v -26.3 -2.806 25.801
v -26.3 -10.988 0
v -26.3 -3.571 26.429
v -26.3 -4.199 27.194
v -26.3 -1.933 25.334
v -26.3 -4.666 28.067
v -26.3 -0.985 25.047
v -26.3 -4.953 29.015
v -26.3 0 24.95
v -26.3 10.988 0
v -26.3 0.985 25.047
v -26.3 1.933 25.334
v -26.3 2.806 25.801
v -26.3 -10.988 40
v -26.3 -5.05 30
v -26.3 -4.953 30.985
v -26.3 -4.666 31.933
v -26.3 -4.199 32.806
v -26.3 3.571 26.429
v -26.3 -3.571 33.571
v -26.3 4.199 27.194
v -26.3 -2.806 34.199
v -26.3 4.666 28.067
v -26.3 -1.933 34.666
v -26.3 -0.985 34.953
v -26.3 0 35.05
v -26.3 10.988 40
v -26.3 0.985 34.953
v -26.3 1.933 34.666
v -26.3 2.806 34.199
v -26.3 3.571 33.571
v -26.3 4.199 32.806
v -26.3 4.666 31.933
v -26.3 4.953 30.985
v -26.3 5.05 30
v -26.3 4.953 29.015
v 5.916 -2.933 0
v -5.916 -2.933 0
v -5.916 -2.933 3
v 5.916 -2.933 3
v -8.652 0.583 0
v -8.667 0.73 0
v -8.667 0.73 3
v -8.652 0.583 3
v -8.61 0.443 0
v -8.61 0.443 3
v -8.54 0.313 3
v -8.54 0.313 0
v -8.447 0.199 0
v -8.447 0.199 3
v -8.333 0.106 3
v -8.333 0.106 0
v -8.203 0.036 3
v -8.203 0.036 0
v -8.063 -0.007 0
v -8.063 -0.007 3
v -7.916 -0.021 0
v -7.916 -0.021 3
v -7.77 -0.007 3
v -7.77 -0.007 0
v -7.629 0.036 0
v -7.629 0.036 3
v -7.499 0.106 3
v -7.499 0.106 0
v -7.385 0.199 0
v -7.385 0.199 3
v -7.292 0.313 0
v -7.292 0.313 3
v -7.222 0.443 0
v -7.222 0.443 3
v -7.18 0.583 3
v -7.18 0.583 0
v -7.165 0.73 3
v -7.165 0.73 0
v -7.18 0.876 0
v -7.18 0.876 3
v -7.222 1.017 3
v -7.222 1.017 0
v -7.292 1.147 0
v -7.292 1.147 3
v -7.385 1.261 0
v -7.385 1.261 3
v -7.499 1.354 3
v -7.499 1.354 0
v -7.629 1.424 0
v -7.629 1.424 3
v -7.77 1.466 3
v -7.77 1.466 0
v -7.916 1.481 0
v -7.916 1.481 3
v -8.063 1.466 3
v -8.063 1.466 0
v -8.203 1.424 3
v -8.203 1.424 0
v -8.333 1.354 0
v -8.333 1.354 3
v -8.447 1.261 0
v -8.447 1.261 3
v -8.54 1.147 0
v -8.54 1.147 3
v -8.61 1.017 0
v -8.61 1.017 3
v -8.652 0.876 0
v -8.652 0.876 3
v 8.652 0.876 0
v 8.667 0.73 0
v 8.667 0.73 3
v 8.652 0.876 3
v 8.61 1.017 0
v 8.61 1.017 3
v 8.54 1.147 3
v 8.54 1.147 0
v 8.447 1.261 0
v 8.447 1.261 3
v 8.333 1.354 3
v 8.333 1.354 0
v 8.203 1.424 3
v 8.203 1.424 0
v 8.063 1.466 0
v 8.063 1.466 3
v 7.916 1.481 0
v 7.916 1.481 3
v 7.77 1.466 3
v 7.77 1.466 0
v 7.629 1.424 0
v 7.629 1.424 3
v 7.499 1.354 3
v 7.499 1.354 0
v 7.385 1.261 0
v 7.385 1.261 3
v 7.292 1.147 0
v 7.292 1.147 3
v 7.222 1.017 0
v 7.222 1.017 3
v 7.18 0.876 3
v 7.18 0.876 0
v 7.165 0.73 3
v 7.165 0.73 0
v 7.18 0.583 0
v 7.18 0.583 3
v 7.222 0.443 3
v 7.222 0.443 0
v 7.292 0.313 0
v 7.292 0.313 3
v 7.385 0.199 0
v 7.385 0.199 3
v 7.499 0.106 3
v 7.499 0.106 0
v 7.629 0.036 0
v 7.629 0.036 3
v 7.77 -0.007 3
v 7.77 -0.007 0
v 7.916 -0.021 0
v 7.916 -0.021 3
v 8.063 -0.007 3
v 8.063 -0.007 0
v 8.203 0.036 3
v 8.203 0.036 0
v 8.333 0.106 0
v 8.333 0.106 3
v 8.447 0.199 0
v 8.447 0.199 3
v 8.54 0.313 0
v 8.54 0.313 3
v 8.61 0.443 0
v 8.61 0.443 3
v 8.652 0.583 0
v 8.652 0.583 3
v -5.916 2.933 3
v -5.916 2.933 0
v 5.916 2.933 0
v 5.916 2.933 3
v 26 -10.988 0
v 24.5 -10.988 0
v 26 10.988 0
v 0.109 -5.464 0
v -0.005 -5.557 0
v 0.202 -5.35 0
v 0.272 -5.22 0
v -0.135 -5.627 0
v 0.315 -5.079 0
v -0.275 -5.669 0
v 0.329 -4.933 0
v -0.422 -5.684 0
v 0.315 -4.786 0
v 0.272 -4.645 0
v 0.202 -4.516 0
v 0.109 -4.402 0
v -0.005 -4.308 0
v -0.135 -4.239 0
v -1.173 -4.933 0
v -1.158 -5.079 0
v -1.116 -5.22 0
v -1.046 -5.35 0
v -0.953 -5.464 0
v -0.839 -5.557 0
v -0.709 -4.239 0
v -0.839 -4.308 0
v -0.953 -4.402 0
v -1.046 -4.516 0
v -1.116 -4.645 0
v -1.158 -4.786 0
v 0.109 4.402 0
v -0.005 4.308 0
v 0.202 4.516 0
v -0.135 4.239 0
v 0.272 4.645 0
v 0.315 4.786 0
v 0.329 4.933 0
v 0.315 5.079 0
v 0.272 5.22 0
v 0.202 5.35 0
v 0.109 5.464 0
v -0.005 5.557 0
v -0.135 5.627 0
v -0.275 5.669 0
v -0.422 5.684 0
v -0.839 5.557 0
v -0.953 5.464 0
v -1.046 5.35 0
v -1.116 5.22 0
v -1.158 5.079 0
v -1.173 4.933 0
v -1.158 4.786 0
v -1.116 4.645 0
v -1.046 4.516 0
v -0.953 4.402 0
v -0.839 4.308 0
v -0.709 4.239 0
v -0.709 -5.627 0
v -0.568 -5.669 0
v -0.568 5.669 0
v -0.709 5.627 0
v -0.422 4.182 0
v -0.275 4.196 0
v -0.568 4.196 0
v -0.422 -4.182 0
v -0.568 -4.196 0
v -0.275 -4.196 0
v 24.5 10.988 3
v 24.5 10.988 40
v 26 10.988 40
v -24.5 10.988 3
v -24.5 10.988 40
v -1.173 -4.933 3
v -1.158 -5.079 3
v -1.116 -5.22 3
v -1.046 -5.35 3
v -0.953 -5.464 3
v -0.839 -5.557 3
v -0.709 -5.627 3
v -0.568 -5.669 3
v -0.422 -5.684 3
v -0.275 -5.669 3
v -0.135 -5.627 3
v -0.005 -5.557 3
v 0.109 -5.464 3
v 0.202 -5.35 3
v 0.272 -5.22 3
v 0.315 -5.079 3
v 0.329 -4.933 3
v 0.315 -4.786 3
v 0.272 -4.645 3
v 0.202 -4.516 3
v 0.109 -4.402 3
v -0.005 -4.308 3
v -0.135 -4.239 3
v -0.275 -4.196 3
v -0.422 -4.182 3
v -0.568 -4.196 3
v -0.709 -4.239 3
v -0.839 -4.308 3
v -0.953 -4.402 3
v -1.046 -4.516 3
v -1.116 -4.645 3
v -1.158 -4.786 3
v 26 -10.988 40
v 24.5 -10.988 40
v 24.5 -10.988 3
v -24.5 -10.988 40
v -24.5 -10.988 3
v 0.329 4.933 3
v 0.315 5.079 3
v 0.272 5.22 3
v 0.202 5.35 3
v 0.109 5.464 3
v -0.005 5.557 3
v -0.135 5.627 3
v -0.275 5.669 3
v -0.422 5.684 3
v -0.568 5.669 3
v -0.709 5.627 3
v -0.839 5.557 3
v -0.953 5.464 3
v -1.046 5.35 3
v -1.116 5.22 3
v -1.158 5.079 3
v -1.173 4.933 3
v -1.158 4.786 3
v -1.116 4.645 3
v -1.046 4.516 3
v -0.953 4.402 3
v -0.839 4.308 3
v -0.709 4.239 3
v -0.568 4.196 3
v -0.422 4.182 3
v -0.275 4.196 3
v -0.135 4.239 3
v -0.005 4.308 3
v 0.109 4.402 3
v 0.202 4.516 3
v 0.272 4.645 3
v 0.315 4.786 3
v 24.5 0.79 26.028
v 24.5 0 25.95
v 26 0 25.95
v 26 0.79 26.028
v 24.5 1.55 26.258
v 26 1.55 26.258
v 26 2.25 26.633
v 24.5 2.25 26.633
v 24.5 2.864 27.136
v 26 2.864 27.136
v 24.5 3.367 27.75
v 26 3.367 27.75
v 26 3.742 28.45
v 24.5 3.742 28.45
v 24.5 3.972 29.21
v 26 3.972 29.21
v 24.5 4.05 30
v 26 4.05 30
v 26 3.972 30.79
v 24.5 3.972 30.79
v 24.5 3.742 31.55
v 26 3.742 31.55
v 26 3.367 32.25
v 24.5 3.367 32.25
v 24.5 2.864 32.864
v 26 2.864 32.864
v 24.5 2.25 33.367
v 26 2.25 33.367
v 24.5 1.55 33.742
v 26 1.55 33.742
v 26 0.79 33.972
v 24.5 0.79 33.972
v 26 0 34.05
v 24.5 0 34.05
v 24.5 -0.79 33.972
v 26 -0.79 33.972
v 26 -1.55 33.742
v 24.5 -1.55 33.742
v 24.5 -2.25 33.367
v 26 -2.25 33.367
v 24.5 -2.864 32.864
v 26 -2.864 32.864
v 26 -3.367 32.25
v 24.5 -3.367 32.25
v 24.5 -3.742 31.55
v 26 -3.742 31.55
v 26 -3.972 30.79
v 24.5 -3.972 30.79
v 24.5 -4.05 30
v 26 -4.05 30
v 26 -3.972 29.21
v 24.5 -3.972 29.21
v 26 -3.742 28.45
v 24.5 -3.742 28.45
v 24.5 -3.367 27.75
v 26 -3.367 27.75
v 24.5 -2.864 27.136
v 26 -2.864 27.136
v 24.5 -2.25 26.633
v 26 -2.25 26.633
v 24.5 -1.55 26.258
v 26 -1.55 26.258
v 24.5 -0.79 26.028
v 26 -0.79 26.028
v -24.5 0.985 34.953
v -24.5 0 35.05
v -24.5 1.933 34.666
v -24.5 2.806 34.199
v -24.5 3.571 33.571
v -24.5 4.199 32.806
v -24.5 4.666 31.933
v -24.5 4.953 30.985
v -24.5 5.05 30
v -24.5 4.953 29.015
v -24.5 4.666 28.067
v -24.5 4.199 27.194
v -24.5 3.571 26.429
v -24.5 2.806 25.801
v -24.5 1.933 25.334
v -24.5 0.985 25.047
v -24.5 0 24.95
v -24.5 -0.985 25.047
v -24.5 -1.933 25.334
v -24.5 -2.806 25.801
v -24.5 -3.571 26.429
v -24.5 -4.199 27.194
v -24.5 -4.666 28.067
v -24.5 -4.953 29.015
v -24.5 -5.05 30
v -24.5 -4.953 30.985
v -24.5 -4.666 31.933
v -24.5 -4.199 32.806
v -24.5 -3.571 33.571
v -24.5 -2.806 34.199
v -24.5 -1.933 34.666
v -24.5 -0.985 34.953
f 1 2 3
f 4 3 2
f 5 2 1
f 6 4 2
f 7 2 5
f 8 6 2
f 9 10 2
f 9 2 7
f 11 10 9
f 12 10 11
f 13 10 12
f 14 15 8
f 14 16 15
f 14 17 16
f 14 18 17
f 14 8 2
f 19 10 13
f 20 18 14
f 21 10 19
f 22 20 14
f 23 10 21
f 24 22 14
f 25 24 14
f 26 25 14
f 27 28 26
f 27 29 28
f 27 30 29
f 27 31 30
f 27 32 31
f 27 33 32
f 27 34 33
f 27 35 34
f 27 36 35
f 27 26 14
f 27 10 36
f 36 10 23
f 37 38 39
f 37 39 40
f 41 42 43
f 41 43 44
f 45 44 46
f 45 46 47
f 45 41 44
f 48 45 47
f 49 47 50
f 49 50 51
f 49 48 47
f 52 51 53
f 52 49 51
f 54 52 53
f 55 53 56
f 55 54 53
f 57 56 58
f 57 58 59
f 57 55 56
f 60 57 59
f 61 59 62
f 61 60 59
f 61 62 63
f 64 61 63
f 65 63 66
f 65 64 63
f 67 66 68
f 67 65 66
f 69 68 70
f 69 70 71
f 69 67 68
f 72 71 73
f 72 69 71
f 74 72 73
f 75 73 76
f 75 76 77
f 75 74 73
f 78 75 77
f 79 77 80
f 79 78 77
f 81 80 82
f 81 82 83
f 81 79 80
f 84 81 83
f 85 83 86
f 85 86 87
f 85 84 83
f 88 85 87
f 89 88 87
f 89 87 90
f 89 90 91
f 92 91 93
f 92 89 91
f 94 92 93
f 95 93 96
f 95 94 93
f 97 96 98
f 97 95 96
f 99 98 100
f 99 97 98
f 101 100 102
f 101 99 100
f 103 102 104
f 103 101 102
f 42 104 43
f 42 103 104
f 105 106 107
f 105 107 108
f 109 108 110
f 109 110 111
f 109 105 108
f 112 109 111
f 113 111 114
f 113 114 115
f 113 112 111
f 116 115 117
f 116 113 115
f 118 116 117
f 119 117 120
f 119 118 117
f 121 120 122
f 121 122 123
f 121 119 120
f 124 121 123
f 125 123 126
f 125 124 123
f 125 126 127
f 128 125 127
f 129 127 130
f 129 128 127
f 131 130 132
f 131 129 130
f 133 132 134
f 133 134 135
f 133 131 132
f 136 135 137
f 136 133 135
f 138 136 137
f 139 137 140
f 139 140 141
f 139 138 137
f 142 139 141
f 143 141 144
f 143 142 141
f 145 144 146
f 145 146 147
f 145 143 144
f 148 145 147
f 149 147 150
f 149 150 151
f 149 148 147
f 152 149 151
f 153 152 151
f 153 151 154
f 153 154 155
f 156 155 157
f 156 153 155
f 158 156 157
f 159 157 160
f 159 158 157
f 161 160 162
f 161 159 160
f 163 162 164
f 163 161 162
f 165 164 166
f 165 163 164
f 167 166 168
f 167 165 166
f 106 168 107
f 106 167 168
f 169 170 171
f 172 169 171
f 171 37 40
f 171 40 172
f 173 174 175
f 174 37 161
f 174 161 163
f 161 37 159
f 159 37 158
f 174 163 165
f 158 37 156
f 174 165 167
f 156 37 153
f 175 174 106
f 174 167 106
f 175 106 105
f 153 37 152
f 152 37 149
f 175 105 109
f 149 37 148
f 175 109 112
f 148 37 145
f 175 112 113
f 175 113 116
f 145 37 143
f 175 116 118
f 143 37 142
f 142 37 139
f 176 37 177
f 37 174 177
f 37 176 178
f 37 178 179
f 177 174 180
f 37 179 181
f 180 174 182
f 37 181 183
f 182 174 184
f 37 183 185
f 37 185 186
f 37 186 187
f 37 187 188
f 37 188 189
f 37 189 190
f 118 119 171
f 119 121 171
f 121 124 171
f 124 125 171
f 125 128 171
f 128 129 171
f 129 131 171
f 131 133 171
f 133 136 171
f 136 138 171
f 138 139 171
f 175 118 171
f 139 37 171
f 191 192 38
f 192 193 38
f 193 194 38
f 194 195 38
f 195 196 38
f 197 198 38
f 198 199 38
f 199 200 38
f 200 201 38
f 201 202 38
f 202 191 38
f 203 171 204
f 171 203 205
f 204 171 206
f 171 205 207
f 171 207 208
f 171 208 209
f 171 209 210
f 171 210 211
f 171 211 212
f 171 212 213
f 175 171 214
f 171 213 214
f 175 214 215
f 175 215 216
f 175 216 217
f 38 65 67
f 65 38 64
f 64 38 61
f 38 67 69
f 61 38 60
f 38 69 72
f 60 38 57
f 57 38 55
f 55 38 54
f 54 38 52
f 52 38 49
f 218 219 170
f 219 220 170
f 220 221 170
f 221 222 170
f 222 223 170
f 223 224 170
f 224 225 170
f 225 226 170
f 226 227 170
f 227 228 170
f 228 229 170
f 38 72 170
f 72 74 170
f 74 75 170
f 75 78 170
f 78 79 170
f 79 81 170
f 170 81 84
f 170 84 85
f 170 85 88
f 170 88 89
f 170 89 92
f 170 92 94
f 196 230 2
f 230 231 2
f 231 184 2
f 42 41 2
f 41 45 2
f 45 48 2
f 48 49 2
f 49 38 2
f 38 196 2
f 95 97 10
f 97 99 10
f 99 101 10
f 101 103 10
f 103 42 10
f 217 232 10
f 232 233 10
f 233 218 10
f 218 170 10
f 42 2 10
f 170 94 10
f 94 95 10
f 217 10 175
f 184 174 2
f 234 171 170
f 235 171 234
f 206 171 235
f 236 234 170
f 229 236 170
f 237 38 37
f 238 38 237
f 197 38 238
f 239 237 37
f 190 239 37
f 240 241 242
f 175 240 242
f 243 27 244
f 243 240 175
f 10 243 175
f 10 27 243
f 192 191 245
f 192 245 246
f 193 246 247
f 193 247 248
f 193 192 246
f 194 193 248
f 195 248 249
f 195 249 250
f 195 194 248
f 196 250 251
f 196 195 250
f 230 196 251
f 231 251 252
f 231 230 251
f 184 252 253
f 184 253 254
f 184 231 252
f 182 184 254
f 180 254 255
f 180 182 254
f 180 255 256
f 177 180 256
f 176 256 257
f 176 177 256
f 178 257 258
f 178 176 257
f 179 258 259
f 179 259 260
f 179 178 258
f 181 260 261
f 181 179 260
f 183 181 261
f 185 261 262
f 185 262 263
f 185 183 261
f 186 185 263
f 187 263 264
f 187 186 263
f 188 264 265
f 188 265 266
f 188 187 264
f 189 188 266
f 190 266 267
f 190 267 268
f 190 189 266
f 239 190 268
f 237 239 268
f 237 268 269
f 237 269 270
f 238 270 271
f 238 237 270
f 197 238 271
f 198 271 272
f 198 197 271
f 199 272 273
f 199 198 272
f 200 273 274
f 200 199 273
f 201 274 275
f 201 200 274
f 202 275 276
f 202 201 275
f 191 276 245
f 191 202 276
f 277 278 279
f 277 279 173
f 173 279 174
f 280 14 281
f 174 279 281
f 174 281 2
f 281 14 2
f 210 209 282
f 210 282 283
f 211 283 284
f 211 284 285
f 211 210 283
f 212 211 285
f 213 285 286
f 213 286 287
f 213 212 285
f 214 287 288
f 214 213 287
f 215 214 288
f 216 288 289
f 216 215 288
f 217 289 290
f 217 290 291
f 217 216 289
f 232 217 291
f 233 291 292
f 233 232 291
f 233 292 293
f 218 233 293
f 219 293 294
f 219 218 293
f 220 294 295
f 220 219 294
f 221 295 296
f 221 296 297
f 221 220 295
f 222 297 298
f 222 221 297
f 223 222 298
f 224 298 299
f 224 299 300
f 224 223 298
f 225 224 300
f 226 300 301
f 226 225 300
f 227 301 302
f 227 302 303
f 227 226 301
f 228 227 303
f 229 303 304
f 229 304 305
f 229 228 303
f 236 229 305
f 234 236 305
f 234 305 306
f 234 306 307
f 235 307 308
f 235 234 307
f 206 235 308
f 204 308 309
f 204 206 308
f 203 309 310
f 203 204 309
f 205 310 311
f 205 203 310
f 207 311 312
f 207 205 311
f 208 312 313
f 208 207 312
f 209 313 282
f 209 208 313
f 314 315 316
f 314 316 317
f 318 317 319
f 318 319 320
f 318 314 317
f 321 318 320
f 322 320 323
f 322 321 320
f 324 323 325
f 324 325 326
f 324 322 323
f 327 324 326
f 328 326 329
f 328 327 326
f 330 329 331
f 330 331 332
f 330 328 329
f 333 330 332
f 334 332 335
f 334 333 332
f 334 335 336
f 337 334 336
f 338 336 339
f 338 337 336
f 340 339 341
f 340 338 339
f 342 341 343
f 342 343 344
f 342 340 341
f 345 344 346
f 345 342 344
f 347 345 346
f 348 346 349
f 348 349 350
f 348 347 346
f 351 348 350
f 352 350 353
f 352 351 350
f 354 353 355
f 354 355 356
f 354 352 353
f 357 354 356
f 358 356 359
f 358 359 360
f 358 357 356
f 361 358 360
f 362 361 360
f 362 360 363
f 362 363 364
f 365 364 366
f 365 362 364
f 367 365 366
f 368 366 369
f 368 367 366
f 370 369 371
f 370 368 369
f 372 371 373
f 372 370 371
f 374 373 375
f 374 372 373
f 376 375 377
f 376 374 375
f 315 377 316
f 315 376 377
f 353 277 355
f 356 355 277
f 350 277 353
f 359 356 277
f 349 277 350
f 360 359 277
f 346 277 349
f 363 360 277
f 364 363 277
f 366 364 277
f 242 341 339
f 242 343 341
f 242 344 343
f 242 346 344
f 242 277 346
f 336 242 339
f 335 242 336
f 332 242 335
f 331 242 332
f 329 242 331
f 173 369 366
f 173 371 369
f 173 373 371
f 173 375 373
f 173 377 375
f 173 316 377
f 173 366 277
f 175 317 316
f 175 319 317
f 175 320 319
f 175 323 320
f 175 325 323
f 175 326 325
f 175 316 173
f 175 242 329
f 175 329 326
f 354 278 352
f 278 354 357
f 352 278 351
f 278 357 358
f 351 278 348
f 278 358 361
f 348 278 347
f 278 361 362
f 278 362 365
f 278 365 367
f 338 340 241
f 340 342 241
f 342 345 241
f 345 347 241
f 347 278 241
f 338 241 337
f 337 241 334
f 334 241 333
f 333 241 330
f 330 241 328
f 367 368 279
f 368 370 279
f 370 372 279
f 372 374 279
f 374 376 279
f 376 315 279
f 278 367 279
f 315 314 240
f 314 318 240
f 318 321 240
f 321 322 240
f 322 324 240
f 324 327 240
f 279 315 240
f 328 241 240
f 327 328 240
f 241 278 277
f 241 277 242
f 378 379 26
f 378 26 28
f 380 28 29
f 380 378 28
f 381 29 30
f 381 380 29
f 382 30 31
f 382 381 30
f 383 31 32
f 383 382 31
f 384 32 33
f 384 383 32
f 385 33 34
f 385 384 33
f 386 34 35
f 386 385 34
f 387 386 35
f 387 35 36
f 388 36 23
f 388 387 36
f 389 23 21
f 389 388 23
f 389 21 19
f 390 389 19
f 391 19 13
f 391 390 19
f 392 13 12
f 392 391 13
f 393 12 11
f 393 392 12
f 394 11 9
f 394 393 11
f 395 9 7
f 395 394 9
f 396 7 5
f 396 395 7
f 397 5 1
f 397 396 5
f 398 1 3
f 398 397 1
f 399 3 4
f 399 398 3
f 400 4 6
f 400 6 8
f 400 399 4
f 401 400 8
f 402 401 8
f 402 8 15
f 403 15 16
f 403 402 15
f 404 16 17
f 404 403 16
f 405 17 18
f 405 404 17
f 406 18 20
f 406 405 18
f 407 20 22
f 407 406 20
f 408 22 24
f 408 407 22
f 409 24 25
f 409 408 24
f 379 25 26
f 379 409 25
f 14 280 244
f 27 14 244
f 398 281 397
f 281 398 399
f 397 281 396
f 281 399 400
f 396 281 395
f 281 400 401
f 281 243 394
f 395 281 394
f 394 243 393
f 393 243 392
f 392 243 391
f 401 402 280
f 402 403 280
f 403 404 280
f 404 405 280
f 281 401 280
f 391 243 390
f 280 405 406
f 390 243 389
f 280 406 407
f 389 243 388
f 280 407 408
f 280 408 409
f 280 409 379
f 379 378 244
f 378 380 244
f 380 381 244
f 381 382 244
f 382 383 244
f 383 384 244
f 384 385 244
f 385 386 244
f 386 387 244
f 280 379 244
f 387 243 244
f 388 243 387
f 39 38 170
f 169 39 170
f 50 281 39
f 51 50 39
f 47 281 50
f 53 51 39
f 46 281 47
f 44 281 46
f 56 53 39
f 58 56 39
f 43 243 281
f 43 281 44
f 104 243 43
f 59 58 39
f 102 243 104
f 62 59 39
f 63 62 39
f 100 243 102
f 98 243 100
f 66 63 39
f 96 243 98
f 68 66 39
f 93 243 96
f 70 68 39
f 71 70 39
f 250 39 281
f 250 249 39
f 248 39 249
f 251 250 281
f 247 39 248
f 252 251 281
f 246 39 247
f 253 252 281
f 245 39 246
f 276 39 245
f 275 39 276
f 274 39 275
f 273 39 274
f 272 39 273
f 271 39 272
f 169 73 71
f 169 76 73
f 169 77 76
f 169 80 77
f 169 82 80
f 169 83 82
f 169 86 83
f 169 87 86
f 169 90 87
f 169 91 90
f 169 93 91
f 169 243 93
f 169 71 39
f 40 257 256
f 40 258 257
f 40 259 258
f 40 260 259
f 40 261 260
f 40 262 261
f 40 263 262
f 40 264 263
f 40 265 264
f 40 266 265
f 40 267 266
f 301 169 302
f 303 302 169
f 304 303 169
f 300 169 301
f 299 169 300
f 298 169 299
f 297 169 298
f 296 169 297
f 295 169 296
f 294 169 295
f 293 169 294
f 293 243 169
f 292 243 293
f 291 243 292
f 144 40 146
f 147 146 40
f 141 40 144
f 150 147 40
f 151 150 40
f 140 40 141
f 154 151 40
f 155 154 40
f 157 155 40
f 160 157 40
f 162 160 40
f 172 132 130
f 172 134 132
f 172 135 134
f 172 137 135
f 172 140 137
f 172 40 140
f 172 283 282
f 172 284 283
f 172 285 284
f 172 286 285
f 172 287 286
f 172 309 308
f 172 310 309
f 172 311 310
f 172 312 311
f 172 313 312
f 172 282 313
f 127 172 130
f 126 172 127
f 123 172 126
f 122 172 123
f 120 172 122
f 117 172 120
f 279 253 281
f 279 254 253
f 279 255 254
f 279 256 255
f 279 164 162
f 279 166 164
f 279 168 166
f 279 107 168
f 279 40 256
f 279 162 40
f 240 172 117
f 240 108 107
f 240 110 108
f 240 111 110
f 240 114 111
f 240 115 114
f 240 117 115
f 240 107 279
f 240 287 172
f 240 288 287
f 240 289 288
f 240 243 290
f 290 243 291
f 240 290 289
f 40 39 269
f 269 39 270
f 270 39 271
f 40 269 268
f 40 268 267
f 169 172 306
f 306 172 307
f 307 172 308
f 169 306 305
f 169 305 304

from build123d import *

# Parameters (mm, degrees)
ESBO_O1_W                = 49
ESBO_O1_H                = 21.976467336
ESBO_O1_R                = 0.750862634
ESBO_O1_W_2              = 11.832091764
ESBO_O1_H_2              = 5.865635034
RESSALTO_EXTRUS_O1_DEPTH = 3
ESBO_O2_W                = 40
ESBO_O2_H                = 21.976467336
ESBO_O2_R                = 5.05
RESSALTO_EXTRUS_O2_DEPTH = 1.8
ESBO_O3_W                = 40
ESBO_O3_H                = 21.97646734
ESBO_O3_R                = 4.05
RESSALTO_EXTRUS_O3_DEPTH = 1.5


with BuildPart() as part:
    # Esboço1 → Ressalto-extrusão1 (new body)
    with BuildSketch(Plane.XY):
        Rectangle(ESBO_O1_W, ESBO_O1_H)
        with Locations((-0.421929048, 4.932817517)):
            Circle(ESBO_O1_R, mode=Mode.SUBTRACT)
        with Locations((7.916045882, 0.729927039)):
            Circle(ESBO_O1_R, mode=Mode.SUBTRACT)
        with Locations(Location((-0.421929048, -4.932817517, 0), (0, 0, 180))):
            Circle(ESBO_O1_R, mode=Mode.SUBTRACT)
        with Locations(Location((-7.916045882, 0.729927039, 0), (0, 0, 180))):
            Circle(ESBO_O1_R, mode=Mode.SUBTRACT)
        Rectangle(ESBO_O1_W_2, ESBO_O1_H_2, mode=Mode.SUBTRACT)
    extrude(amount=RESSALTO_EXTRUS_O1_DEPTH)

    # Esboço2 → Ressalto-extrusão2 (add)
    with BuildSketch(Plane.ZY.offset(24.5)):
        with Locations((20, 0)):
            Rectangle(ESBO_O2_W, ESBO_O2_H)
        with Locations((30, 0)):
            Circle(ESBO_O2_R, mode=Mode.SUBTRACT)
    extrude(amount=RESSALTO_EXTRUS_O2_DEPTH)

    # Esboço3 → Ressalto-extrusão3 (add)
    with BuildSketch(Plane(origin=(24.5, 0, 0), x_dir=(0, 0, -1), z_dir=(1, 0, 0))):
        with Locations((-20, -2e-09)):
            Rectangle(ESBO_O3_W, ESBO_O3_H)
        with Locations((-30, 0)):
            Circle(ESBO_O3_R, mode=Mode.SUBTRACT)
    extrude(amount=RESSALTO_EXTRUS_O3_DEPTH)


solid = part.part
